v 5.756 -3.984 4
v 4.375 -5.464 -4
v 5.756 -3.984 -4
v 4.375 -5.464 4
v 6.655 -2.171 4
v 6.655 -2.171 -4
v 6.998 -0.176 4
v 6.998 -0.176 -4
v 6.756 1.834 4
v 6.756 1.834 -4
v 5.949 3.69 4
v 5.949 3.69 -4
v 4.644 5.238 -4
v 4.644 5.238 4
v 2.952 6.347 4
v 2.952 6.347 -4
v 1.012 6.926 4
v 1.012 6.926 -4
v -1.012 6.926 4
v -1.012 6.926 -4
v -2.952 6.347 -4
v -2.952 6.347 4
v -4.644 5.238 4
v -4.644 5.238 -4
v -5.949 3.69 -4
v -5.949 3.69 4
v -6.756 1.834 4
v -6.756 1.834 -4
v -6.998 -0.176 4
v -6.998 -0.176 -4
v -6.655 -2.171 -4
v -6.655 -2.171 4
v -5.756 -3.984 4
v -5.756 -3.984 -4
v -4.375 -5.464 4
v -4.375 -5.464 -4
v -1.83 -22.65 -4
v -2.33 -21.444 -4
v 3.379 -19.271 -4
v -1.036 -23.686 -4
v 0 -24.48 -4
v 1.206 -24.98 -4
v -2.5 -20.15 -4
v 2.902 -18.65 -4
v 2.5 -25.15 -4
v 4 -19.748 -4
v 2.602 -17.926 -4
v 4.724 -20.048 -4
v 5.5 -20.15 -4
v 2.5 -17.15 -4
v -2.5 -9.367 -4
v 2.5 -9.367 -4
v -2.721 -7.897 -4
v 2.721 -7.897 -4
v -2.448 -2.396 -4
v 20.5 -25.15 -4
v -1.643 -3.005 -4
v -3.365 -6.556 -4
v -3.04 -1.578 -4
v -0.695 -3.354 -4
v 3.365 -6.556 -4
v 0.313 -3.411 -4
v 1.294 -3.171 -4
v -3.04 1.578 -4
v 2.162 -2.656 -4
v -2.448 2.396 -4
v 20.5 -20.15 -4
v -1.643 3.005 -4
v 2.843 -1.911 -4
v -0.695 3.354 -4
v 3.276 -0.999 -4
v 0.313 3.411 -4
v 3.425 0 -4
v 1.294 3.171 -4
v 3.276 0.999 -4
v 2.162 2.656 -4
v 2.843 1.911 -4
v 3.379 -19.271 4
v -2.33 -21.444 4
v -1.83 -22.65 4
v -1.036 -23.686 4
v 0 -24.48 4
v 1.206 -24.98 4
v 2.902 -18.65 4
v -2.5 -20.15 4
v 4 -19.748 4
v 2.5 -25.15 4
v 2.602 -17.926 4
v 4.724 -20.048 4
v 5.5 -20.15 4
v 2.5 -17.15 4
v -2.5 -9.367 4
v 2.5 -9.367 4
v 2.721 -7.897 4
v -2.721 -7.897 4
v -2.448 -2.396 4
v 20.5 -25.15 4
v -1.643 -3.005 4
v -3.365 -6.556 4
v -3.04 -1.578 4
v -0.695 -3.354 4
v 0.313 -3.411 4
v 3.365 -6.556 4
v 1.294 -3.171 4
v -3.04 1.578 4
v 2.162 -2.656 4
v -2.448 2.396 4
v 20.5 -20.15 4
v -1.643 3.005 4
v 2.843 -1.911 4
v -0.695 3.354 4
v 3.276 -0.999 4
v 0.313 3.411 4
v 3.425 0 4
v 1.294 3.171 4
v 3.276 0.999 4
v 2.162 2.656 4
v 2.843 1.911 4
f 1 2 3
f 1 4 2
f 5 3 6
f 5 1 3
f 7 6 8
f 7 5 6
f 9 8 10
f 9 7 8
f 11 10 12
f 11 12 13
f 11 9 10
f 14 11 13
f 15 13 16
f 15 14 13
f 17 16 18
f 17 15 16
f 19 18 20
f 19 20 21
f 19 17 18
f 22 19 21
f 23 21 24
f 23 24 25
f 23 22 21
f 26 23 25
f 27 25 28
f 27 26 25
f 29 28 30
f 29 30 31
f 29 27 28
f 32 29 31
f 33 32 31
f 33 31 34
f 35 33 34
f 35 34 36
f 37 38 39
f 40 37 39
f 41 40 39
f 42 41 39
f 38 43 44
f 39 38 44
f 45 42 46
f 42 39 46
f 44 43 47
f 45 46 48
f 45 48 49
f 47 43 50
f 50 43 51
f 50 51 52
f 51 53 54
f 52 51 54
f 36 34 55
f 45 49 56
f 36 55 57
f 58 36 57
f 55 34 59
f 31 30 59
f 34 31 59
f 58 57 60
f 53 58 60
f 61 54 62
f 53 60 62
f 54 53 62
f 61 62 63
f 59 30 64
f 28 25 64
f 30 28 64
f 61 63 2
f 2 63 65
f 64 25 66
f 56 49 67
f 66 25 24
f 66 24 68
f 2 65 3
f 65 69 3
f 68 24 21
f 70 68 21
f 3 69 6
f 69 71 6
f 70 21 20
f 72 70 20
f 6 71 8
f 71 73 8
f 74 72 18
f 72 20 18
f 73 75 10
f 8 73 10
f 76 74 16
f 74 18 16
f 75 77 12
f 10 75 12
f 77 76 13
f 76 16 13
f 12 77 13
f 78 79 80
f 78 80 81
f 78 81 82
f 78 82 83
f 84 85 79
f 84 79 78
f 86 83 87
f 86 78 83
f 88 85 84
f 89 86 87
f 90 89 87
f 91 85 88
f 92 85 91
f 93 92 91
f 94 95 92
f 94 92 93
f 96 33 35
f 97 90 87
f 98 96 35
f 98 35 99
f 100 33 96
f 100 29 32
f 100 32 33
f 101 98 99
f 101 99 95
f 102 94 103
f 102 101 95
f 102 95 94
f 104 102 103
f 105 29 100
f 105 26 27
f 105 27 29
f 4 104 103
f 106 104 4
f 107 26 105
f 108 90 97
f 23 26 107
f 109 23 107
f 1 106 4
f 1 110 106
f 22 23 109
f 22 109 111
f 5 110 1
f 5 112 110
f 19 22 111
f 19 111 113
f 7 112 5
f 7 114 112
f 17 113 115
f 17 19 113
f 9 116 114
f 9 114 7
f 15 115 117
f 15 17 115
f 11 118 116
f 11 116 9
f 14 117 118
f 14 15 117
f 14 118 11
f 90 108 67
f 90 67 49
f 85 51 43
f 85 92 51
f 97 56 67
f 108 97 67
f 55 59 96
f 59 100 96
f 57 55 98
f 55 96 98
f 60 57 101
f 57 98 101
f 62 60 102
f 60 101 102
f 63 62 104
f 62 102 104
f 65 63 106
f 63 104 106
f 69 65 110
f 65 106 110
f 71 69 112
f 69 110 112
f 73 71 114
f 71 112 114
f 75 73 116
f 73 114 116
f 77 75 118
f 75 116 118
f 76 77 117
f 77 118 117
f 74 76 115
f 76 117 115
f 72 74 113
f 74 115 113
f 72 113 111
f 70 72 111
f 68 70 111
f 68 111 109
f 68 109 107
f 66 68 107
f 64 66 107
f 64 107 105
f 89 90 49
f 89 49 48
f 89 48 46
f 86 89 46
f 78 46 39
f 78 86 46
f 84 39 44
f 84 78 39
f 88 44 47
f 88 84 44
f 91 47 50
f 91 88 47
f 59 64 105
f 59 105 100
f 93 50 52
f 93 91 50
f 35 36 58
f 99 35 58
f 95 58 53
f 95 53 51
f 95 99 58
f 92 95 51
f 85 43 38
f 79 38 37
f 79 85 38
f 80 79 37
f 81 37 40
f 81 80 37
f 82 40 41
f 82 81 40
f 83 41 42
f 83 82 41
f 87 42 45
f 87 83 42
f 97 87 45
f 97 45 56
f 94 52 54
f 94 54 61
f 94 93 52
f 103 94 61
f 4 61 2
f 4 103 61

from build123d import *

# Parameters (mm, degrees)
BOSS_EXTRUDE1_DEPTH = 4


with BuildPart() as part:
    # Sketch1 → Boss-Extrude1 (new, symmetric)
    with BuildSketch(Plane.XY):
        with BuildLine():
            Line((-2.5, -9.367496998), (-2.5, -20.15))
            ThreePointArc((-2.5, -20.15), (-1.035533906, -23.685533906), (2.5, -25.15))
            Line((2.5, -25.15), (20.5, -25.15))
            Line((20.5, -25.15), (20.5, -20.15))
            Line((20.5, -20.15), (5.5, -20.15))
            ThreePointArc((5.5, -20.15), (3.378679656, -19.271320344), (2.5, -17.15))
            Line((2.5, -17.15), (2.5, -9.367496998))
            ThreePointArc((2.5, -9.367496998), (2.993060906, -7.202433488), (4.375, -5.464373249))
            ThreePointArc((4.375, -5.464373249), (0, 7), (-4.375, -5.464373249))
            ThreePointArc((-4.375, -5.464373249), (-2.993060906, -7.202433488), (-2.5, -9.367496998))
        make_face()
        with BuildLine():
            Line((-3.04, 1.577664413), (-3.04, -1.577664413))
            ThreePointArc((-3.04, -1.577664413), (3.425, 0), (-3.04, 1.577664413))
        make_face(mode=Mode.SUBTRACT)
    extrude(amount=BOSS_EXTRUDE1_DEPTH, both=True)


solid = part.part
